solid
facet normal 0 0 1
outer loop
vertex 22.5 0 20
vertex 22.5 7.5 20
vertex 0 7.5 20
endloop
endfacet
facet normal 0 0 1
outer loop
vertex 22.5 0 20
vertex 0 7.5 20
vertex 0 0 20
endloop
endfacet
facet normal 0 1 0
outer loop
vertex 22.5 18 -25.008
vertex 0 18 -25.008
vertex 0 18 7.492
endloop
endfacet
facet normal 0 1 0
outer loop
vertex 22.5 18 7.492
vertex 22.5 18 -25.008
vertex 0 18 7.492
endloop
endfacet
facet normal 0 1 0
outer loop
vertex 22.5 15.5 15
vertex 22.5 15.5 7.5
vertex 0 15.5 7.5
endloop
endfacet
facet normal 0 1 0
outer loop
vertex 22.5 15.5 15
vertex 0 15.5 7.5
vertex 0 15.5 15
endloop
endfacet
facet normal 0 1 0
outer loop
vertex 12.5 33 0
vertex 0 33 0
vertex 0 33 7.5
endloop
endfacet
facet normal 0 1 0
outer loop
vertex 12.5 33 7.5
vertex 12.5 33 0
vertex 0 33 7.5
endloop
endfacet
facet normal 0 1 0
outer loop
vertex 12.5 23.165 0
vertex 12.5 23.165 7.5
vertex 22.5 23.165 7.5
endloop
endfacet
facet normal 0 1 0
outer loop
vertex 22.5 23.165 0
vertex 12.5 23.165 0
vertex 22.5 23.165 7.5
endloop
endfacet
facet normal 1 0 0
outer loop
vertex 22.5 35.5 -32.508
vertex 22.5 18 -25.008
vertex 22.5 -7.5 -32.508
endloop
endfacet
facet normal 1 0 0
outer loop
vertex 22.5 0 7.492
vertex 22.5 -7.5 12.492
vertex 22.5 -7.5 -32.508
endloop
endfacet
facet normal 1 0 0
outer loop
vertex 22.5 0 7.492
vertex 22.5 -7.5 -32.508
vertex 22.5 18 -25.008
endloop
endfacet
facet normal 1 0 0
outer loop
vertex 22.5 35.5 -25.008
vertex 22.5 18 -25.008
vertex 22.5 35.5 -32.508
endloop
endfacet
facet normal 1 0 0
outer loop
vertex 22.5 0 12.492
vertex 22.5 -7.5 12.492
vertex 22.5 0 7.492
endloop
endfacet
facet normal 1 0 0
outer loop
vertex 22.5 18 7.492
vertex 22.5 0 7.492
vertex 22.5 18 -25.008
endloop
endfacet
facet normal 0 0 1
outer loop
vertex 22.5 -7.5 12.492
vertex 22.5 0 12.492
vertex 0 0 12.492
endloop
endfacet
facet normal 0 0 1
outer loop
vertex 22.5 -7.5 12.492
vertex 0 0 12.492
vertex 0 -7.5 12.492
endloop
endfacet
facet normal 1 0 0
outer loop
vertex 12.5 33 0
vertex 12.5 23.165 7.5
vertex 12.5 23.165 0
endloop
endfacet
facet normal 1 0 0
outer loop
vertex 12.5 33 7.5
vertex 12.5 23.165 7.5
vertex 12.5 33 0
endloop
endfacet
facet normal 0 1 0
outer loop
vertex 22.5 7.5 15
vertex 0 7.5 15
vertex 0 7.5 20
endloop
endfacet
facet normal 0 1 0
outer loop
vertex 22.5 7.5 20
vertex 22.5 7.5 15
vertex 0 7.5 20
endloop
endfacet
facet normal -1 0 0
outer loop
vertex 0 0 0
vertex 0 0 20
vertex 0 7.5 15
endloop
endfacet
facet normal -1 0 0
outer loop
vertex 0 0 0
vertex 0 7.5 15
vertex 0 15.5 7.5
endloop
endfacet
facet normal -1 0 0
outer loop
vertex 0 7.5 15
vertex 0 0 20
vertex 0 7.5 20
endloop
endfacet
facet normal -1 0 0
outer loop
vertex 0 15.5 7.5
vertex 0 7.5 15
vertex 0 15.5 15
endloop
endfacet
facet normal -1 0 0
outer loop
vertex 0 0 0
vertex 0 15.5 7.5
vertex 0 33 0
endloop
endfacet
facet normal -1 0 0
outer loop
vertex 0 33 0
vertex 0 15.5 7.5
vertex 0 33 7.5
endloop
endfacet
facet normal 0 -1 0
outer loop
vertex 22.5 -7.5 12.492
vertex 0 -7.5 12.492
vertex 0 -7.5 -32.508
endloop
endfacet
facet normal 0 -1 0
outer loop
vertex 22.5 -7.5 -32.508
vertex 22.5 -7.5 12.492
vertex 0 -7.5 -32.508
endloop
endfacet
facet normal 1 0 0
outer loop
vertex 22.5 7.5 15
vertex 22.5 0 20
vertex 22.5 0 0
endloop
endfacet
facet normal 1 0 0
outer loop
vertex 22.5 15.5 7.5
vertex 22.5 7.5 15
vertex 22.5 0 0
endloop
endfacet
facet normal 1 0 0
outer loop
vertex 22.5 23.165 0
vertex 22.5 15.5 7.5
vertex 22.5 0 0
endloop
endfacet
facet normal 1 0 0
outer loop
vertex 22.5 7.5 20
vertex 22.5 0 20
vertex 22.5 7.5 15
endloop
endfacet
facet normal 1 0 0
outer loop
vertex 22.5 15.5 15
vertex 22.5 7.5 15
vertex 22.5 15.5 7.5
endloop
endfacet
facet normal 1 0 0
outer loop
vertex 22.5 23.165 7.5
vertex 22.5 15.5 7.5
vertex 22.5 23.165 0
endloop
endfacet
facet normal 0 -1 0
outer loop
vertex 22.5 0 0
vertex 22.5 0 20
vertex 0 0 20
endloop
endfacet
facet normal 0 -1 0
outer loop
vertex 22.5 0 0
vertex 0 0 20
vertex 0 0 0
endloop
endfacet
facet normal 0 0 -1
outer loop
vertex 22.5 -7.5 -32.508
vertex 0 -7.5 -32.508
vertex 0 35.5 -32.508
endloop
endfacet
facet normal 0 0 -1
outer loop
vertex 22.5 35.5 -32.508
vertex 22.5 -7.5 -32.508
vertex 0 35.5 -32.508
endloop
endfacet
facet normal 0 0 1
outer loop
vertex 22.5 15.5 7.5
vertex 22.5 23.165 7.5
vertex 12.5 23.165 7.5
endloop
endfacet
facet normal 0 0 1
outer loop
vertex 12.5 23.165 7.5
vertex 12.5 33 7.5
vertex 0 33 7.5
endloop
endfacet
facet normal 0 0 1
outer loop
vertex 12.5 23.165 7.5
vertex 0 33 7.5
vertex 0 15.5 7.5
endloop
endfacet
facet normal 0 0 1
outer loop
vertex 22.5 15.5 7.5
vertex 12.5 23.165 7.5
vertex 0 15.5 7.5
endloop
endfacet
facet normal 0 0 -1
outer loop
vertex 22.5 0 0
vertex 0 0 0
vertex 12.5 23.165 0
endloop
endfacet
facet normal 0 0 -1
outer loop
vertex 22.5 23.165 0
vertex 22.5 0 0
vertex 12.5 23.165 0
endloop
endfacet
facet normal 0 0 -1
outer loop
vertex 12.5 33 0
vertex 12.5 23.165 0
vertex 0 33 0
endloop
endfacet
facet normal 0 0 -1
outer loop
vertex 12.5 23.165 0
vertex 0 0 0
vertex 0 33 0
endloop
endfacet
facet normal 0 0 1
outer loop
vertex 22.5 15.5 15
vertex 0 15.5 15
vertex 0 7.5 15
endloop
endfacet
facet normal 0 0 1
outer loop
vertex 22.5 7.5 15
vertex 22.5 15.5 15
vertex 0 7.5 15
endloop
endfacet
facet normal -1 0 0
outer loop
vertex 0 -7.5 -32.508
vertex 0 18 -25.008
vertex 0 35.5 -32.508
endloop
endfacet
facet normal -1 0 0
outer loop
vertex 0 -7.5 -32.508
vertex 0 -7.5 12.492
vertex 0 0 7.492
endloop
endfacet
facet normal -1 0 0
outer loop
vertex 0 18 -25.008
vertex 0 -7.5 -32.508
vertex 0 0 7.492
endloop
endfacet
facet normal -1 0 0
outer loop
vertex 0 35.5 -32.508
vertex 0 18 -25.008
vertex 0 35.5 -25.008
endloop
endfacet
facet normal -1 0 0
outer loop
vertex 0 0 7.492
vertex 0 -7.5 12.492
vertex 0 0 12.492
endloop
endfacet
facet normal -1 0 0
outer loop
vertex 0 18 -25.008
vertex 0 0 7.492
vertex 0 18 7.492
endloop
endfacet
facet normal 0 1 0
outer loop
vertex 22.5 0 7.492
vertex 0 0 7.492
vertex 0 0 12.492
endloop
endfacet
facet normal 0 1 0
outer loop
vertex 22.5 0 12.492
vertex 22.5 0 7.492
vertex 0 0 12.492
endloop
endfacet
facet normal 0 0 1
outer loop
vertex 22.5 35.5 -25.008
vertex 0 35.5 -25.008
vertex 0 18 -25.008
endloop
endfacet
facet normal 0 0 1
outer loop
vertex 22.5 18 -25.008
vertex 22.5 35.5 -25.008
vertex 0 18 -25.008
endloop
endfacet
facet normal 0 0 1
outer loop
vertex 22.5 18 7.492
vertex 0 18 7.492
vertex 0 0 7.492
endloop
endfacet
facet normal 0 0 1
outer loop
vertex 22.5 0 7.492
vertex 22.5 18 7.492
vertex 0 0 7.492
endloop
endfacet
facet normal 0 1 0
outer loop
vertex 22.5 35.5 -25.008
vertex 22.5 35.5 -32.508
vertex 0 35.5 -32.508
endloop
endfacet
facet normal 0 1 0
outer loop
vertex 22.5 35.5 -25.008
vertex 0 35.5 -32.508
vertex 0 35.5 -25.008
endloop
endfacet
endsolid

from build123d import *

# Parameters (mm, degrees)
F1_DEPTH = 22.5
F2_W     = 10
F2_H     = 9.8351926783
F3_DEPTH = 25
F5_DEPTH = 22.5


with BuildPart() as f1:
    # F0 (on Right) → F1 (new body)
    with BuildSketch(Plane.YZ):
        Polygon((0, 20), (0, 0), (33, 0), (33, 7.5), (15.5, 7.5), (15.5, 15), (7.5, 15), (7.5, 20), align=None)
    extrude(amount=F1_DEPTH)

    # F2 (on face) → F3 (cut)
    with BuildSketch(Plane.XY.offset(7.5)):
        with Locations((17.5, 28.0824036609)):
            Rectangle(F2_W, F2_H)
    extrude(amount=-F3_DEPTH, mode=Mode.SUBTRACT)


with BuildPart() as f5:
    # F4 (on Right) → F5 (new body)
    with BuildSketch(Plane.YZ):
        Polygon((-7.5, 12.491991818), (-7.5, -32.508008182), (35.5, -32.508008182), (35.5, -25.008008182), (18, -25.008008182), (18, 7.491991818), (0, 7.491991818), (0, 12.491991818), align=None)
    extrude(amount=F5_DEPTH)


solid = Compound([f1.part, f5.part])
